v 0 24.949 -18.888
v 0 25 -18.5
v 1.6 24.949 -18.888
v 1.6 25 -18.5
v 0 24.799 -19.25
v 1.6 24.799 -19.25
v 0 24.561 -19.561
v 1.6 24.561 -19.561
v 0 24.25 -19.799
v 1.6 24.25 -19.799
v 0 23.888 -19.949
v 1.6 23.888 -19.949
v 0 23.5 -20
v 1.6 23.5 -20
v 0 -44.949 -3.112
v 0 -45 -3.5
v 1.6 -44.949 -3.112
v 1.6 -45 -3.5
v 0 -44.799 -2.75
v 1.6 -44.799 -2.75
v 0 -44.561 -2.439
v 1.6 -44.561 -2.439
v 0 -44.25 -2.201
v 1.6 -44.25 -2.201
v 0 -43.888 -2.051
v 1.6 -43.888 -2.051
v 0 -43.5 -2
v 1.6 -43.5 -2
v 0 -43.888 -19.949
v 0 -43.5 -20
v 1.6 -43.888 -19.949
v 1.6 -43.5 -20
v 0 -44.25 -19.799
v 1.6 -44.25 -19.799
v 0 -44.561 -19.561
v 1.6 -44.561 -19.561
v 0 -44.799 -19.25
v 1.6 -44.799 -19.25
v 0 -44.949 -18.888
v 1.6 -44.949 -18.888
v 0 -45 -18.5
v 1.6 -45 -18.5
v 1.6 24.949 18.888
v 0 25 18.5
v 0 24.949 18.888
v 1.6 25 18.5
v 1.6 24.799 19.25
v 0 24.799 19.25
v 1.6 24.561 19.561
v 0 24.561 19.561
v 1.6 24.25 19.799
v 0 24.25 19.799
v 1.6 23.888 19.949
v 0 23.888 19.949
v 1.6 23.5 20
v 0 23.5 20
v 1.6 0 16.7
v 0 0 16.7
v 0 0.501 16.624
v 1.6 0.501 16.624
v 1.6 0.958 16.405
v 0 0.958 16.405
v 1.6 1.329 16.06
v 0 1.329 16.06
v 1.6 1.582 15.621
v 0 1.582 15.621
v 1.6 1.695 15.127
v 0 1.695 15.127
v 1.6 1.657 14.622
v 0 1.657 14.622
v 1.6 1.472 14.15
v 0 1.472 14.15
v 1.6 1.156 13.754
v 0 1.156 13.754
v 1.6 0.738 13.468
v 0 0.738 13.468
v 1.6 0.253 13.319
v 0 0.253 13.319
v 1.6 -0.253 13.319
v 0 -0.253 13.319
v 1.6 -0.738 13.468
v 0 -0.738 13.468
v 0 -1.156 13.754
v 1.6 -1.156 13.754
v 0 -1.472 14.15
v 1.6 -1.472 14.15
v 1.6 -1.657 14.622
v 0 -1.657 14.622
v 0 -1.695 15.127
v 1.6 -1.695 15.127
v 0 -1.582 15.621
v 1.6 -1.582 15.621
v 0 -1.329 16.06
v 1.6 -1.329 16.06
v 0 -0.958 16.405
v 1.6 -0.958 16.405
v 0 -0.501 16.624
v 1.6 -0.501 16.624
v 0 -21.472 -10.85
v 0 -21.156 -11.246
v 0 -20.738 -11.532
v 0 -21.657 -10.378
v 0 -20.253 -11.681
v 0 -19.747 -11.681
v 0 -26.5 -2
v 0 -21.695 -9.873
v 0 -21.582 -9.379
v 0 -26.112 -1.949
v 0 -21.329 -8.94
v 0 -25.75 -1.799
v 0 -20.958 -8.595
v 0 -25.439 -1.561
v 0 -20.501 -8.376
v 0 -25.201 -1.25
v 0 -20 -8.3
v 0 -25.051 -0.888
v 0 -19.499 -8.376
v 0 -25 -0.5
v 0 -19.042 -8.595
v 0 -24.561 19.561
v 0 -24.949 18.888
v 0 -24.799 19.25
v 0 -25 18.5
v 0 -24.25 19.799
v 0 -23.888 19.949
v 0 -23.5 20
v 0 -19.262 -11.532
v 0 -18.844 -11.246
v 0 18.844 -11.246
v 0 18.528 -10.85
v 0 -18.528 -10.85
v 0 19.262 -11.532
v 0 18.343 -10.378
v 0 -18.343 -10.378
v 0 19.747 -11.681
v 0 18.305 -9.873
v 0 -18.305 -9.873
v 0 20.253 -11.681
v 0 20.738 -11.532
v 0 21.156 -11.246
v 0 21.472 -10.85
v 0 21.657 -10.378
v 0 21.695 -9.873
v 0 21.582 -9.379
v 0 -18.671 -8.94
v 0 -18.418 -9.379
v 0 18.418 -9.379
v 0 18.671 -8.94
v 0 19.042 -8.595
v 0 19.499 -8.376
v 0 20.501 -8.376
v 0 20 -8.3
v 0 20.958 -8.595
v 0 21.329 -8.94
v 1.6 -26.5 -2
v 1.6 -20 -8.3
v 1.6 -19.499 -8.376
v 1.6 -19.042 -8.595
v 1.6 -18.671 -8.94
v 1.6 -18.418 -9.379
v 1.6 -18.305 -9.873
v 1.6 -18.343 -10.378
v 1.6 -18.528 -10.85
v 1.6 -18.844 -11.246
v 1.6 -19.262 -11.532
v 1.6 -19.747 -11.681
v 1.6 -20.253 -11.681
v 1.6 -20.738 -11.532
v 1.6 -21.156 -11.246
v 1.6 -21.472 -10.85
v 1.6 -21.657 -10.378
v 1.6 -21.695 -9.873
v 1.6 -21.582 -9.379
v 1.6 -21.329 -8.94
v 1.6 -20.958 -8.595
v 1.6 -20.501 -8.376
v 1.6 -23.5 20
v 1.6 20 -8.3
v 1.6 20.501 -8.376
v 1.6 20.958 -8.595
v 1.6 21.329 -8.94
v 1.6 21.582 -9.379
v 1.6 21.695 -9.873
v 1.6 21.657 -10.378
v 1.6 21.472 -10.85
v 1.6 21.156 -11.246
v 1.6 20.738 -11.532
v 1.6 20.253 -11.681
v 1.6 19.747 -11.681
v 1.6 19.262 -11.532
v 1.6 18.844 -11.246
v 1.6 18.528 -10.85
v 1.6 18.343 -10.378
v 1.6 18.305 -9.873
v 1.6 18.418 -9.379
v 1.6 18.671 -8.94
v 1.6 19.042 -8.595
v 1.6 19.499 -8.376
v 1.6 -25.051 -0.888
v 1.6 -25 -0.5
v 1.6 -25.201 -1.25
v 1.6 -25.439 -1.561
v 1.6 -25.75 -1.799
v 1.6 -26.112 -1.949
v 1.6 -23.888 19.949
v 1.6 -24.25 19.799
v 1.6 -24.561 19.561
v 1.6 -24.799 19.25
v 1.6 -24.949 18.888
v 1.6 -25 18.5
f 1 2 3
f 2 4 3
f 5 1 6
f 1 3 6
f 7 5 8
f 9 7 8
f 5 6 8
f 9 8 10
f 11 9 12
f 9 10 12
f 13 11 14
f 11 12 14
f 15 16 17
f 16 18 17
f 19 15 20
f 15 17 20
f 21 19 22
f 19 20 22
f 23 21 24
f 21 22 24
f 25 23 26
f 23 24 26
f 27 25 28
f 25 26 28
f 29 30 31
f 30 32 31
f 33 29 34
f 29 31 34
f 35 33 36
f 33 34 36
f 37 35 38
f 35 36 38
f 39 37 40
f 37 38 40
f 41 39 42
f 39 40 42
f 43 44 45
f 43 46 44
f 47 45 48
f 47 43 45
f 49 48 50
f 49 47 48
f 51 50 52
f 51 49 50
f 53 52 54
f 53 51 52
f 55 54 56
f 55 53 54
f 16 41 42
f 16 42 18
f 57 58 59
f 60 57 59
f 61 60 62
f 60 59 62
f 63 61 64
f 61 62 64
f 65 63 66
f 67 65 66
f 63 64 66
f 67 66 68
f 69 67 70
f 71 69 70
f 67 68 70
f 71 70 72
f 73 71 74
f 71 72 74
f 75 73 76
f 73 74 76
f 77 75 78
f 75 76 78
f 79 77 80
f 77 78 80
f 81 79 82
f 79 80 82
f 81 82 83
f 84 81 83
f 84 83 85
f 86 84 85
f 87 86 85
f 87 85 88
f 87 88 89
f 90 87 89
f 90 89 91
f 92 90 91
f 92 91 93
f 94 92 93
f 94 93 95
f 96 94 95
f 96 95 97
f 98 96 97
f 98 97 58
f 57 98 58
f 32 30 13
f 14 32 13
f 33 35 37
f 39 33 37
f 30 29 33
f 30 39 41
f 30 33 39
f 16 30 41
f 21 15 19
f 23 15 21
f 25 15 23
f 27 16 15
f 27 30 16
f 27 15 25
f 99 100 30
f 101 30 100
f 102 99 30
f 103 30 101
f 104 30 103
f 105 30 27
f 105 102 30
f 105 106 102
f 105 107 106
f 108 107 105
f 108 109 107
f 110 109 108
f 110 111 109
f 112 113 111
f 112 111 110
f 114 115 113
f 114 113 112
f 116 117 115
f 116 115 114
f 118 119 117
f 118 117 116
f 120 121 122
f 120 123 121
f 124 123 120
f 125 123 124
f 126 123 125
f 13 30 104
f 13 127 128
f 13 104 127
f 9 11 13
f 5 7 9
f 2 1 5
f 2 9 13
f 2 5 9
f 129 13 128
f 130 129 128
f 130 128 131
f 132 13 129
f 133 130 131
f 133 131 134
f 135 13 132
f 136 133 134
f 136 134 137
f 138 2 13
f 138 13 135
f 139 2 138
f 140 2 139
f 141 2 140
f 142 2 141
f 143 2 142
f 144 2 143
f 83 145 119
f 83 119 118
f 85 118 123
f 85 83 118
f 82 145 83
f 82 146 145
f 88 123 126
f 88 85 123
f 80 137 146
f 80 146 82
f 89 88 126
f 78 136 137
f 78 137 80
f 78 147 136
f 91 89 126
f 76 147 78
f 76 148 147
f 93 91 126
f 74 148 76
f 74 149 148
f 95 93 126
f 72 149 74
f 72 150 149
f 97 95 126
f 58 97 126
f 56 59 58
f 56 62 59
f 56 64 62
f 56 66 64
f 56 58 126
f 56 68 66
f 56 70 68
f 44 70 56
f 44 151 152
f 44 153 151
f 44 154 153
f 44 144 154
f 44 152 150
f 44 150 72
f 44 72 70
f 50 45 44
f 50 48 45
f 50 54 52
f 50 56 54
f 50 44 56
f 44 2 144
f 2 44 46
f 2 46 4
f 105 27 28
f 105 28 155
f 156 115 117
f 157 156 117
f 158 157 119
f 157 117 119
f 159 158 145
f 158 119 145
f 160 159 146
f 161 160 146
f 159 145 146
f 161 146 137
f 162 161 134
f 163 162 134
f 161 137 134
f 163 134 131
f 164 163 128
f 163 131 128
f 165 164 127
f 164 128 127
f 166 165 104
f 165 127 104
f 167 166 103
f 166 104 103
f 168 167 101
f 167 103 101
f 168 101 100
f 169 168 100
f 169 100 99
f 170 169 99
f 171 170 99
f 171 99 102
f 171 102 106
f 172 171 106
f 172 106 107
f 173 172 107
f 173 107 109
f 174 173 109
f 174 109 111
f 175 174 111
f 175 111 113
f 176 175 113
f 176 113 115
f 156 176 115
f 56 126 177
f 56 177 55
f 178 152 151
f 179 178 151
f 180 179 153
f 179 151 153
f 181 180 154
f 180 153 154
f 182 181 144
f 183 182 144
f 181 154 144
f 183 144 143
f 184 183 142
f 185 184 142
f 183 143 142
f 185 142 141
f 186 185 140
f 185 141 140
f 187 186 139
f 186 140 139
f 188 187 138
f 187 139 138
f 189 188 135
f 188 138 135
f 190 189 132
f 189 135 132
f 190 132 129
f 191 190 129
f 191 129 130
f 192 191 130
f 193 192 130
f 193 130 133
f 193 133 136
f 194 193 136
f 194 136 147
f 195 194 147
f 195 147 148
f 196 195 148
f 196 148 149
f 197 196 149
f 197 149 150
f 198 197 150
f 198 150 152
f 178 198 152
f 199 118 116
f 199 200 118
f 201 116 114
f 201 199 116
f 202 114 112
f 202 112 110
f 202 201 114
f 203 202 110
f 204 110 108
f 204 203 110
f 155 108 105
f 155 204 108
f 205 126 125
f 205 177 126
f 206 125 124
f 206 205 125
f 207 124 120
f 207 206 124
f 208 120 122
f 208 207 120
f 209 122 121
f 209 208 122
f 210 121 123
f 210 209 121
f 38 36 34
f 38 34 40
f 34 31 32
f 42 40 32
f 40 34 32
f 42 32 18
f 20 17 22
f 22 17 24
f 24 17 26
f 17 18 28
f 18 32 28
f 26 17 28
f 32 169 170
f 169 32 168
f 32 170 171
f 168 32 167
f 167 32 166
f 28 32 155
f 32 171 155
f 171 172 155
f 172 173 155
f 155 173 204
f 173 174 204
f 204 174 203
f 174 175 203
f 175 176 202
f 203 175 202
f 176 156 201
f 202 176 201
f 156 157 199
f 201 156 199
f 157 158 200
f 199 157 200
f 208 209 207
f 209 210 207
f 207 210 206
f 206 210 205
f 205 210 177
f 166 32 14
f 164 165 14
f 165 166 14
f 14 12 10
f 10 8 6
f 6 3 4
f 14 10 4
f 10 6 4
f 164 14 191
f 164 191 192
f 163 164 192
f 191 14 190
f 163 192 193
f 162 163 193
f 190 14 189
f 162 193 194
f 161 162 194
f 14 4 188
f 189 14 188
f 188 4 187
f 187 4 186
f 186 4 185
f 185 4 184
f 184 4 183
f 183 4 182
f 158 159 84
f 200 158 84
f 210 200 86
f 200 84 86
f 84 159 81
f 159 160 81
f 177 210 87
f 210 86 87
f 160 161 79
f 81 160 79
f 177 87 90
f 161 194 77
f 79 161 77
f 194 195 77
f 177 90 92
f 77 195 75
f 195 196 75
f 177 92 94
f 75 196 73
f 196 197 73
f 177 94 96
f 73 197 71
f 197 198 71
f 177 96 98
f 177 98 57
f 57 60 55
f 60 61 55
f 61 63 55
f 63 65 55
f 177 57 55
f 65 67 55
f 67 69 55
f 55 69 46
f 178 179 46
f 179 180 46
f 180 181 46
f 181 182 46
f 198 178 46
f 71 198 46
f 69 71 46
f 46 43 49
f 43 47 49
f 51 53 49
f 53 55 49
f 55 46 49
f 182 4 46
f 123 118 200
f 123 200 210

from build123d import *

# Parameters (mm, degrees)
BOSS_EXTRUDE1_DEPTH      = 1.6002
M3_CLEARANCE_HOLE1_D     = 3.4
M3_CLEARANCE_HOLE1_DEPTH = 6
M3_CLEARANCE_HOLE1_TIP   = 1.021463052
FILLET1_R                = 1.5


with BuildPart() as part:
    # Sketch1 → Boss-Extrude1 (new body)
    with BuildSketch(Plane(origin=(0, 0, 0), x_dir=(0, 0, -1), z_dir=(1, 0, 0))):
        Polygon((-20, 25), (20, 25), (20, -25), (20, -45), (2, -45), (2, -25), (-20, -25), align=None)
    extrude(amount=BOSS_EXTRUDE1_DEPTH)

    # M3 Clearance Hole1
    with Locations(Plane(origin=(1.6002, 0, 0), x_dir=(0, 0, -1), z_dir=(1, 0, 0))):
        with Locations((10, 20), (10, -20), (-15, 0)):
            Hole(M3_CLEARANCE_HOLE1_D / 2, depth=M3_CLEARANCE_HOLE1_DEPTH)
            with Locations((0, 0, -(M3_CLEARANCE_HOLE1_DEPTH + M3_CLEARANCE_HOLE1_TIP / 2))):  # 118° drill point
                Cone(0, M3_CLEARANCE_HOLE1_D / 2, M3_CLEARANCE_HOLE1_TIP, mode=Mode.SUBTRACT)

    # Fillet1
    fillet1_edges = [part.edges().sort_by_distance(p)[0] for p in [
        (0.8001, -45, -20),
        (0.8001, -45, -2),
        (0.8001, -25, -2),
        (0.8001, -25, 20),
        (0.8001, 25, 20),
        (0.8001, 25, -20),
    ]]
    fillet(fillet1_edges, radius=FILLET1_R)


solid = part.part
